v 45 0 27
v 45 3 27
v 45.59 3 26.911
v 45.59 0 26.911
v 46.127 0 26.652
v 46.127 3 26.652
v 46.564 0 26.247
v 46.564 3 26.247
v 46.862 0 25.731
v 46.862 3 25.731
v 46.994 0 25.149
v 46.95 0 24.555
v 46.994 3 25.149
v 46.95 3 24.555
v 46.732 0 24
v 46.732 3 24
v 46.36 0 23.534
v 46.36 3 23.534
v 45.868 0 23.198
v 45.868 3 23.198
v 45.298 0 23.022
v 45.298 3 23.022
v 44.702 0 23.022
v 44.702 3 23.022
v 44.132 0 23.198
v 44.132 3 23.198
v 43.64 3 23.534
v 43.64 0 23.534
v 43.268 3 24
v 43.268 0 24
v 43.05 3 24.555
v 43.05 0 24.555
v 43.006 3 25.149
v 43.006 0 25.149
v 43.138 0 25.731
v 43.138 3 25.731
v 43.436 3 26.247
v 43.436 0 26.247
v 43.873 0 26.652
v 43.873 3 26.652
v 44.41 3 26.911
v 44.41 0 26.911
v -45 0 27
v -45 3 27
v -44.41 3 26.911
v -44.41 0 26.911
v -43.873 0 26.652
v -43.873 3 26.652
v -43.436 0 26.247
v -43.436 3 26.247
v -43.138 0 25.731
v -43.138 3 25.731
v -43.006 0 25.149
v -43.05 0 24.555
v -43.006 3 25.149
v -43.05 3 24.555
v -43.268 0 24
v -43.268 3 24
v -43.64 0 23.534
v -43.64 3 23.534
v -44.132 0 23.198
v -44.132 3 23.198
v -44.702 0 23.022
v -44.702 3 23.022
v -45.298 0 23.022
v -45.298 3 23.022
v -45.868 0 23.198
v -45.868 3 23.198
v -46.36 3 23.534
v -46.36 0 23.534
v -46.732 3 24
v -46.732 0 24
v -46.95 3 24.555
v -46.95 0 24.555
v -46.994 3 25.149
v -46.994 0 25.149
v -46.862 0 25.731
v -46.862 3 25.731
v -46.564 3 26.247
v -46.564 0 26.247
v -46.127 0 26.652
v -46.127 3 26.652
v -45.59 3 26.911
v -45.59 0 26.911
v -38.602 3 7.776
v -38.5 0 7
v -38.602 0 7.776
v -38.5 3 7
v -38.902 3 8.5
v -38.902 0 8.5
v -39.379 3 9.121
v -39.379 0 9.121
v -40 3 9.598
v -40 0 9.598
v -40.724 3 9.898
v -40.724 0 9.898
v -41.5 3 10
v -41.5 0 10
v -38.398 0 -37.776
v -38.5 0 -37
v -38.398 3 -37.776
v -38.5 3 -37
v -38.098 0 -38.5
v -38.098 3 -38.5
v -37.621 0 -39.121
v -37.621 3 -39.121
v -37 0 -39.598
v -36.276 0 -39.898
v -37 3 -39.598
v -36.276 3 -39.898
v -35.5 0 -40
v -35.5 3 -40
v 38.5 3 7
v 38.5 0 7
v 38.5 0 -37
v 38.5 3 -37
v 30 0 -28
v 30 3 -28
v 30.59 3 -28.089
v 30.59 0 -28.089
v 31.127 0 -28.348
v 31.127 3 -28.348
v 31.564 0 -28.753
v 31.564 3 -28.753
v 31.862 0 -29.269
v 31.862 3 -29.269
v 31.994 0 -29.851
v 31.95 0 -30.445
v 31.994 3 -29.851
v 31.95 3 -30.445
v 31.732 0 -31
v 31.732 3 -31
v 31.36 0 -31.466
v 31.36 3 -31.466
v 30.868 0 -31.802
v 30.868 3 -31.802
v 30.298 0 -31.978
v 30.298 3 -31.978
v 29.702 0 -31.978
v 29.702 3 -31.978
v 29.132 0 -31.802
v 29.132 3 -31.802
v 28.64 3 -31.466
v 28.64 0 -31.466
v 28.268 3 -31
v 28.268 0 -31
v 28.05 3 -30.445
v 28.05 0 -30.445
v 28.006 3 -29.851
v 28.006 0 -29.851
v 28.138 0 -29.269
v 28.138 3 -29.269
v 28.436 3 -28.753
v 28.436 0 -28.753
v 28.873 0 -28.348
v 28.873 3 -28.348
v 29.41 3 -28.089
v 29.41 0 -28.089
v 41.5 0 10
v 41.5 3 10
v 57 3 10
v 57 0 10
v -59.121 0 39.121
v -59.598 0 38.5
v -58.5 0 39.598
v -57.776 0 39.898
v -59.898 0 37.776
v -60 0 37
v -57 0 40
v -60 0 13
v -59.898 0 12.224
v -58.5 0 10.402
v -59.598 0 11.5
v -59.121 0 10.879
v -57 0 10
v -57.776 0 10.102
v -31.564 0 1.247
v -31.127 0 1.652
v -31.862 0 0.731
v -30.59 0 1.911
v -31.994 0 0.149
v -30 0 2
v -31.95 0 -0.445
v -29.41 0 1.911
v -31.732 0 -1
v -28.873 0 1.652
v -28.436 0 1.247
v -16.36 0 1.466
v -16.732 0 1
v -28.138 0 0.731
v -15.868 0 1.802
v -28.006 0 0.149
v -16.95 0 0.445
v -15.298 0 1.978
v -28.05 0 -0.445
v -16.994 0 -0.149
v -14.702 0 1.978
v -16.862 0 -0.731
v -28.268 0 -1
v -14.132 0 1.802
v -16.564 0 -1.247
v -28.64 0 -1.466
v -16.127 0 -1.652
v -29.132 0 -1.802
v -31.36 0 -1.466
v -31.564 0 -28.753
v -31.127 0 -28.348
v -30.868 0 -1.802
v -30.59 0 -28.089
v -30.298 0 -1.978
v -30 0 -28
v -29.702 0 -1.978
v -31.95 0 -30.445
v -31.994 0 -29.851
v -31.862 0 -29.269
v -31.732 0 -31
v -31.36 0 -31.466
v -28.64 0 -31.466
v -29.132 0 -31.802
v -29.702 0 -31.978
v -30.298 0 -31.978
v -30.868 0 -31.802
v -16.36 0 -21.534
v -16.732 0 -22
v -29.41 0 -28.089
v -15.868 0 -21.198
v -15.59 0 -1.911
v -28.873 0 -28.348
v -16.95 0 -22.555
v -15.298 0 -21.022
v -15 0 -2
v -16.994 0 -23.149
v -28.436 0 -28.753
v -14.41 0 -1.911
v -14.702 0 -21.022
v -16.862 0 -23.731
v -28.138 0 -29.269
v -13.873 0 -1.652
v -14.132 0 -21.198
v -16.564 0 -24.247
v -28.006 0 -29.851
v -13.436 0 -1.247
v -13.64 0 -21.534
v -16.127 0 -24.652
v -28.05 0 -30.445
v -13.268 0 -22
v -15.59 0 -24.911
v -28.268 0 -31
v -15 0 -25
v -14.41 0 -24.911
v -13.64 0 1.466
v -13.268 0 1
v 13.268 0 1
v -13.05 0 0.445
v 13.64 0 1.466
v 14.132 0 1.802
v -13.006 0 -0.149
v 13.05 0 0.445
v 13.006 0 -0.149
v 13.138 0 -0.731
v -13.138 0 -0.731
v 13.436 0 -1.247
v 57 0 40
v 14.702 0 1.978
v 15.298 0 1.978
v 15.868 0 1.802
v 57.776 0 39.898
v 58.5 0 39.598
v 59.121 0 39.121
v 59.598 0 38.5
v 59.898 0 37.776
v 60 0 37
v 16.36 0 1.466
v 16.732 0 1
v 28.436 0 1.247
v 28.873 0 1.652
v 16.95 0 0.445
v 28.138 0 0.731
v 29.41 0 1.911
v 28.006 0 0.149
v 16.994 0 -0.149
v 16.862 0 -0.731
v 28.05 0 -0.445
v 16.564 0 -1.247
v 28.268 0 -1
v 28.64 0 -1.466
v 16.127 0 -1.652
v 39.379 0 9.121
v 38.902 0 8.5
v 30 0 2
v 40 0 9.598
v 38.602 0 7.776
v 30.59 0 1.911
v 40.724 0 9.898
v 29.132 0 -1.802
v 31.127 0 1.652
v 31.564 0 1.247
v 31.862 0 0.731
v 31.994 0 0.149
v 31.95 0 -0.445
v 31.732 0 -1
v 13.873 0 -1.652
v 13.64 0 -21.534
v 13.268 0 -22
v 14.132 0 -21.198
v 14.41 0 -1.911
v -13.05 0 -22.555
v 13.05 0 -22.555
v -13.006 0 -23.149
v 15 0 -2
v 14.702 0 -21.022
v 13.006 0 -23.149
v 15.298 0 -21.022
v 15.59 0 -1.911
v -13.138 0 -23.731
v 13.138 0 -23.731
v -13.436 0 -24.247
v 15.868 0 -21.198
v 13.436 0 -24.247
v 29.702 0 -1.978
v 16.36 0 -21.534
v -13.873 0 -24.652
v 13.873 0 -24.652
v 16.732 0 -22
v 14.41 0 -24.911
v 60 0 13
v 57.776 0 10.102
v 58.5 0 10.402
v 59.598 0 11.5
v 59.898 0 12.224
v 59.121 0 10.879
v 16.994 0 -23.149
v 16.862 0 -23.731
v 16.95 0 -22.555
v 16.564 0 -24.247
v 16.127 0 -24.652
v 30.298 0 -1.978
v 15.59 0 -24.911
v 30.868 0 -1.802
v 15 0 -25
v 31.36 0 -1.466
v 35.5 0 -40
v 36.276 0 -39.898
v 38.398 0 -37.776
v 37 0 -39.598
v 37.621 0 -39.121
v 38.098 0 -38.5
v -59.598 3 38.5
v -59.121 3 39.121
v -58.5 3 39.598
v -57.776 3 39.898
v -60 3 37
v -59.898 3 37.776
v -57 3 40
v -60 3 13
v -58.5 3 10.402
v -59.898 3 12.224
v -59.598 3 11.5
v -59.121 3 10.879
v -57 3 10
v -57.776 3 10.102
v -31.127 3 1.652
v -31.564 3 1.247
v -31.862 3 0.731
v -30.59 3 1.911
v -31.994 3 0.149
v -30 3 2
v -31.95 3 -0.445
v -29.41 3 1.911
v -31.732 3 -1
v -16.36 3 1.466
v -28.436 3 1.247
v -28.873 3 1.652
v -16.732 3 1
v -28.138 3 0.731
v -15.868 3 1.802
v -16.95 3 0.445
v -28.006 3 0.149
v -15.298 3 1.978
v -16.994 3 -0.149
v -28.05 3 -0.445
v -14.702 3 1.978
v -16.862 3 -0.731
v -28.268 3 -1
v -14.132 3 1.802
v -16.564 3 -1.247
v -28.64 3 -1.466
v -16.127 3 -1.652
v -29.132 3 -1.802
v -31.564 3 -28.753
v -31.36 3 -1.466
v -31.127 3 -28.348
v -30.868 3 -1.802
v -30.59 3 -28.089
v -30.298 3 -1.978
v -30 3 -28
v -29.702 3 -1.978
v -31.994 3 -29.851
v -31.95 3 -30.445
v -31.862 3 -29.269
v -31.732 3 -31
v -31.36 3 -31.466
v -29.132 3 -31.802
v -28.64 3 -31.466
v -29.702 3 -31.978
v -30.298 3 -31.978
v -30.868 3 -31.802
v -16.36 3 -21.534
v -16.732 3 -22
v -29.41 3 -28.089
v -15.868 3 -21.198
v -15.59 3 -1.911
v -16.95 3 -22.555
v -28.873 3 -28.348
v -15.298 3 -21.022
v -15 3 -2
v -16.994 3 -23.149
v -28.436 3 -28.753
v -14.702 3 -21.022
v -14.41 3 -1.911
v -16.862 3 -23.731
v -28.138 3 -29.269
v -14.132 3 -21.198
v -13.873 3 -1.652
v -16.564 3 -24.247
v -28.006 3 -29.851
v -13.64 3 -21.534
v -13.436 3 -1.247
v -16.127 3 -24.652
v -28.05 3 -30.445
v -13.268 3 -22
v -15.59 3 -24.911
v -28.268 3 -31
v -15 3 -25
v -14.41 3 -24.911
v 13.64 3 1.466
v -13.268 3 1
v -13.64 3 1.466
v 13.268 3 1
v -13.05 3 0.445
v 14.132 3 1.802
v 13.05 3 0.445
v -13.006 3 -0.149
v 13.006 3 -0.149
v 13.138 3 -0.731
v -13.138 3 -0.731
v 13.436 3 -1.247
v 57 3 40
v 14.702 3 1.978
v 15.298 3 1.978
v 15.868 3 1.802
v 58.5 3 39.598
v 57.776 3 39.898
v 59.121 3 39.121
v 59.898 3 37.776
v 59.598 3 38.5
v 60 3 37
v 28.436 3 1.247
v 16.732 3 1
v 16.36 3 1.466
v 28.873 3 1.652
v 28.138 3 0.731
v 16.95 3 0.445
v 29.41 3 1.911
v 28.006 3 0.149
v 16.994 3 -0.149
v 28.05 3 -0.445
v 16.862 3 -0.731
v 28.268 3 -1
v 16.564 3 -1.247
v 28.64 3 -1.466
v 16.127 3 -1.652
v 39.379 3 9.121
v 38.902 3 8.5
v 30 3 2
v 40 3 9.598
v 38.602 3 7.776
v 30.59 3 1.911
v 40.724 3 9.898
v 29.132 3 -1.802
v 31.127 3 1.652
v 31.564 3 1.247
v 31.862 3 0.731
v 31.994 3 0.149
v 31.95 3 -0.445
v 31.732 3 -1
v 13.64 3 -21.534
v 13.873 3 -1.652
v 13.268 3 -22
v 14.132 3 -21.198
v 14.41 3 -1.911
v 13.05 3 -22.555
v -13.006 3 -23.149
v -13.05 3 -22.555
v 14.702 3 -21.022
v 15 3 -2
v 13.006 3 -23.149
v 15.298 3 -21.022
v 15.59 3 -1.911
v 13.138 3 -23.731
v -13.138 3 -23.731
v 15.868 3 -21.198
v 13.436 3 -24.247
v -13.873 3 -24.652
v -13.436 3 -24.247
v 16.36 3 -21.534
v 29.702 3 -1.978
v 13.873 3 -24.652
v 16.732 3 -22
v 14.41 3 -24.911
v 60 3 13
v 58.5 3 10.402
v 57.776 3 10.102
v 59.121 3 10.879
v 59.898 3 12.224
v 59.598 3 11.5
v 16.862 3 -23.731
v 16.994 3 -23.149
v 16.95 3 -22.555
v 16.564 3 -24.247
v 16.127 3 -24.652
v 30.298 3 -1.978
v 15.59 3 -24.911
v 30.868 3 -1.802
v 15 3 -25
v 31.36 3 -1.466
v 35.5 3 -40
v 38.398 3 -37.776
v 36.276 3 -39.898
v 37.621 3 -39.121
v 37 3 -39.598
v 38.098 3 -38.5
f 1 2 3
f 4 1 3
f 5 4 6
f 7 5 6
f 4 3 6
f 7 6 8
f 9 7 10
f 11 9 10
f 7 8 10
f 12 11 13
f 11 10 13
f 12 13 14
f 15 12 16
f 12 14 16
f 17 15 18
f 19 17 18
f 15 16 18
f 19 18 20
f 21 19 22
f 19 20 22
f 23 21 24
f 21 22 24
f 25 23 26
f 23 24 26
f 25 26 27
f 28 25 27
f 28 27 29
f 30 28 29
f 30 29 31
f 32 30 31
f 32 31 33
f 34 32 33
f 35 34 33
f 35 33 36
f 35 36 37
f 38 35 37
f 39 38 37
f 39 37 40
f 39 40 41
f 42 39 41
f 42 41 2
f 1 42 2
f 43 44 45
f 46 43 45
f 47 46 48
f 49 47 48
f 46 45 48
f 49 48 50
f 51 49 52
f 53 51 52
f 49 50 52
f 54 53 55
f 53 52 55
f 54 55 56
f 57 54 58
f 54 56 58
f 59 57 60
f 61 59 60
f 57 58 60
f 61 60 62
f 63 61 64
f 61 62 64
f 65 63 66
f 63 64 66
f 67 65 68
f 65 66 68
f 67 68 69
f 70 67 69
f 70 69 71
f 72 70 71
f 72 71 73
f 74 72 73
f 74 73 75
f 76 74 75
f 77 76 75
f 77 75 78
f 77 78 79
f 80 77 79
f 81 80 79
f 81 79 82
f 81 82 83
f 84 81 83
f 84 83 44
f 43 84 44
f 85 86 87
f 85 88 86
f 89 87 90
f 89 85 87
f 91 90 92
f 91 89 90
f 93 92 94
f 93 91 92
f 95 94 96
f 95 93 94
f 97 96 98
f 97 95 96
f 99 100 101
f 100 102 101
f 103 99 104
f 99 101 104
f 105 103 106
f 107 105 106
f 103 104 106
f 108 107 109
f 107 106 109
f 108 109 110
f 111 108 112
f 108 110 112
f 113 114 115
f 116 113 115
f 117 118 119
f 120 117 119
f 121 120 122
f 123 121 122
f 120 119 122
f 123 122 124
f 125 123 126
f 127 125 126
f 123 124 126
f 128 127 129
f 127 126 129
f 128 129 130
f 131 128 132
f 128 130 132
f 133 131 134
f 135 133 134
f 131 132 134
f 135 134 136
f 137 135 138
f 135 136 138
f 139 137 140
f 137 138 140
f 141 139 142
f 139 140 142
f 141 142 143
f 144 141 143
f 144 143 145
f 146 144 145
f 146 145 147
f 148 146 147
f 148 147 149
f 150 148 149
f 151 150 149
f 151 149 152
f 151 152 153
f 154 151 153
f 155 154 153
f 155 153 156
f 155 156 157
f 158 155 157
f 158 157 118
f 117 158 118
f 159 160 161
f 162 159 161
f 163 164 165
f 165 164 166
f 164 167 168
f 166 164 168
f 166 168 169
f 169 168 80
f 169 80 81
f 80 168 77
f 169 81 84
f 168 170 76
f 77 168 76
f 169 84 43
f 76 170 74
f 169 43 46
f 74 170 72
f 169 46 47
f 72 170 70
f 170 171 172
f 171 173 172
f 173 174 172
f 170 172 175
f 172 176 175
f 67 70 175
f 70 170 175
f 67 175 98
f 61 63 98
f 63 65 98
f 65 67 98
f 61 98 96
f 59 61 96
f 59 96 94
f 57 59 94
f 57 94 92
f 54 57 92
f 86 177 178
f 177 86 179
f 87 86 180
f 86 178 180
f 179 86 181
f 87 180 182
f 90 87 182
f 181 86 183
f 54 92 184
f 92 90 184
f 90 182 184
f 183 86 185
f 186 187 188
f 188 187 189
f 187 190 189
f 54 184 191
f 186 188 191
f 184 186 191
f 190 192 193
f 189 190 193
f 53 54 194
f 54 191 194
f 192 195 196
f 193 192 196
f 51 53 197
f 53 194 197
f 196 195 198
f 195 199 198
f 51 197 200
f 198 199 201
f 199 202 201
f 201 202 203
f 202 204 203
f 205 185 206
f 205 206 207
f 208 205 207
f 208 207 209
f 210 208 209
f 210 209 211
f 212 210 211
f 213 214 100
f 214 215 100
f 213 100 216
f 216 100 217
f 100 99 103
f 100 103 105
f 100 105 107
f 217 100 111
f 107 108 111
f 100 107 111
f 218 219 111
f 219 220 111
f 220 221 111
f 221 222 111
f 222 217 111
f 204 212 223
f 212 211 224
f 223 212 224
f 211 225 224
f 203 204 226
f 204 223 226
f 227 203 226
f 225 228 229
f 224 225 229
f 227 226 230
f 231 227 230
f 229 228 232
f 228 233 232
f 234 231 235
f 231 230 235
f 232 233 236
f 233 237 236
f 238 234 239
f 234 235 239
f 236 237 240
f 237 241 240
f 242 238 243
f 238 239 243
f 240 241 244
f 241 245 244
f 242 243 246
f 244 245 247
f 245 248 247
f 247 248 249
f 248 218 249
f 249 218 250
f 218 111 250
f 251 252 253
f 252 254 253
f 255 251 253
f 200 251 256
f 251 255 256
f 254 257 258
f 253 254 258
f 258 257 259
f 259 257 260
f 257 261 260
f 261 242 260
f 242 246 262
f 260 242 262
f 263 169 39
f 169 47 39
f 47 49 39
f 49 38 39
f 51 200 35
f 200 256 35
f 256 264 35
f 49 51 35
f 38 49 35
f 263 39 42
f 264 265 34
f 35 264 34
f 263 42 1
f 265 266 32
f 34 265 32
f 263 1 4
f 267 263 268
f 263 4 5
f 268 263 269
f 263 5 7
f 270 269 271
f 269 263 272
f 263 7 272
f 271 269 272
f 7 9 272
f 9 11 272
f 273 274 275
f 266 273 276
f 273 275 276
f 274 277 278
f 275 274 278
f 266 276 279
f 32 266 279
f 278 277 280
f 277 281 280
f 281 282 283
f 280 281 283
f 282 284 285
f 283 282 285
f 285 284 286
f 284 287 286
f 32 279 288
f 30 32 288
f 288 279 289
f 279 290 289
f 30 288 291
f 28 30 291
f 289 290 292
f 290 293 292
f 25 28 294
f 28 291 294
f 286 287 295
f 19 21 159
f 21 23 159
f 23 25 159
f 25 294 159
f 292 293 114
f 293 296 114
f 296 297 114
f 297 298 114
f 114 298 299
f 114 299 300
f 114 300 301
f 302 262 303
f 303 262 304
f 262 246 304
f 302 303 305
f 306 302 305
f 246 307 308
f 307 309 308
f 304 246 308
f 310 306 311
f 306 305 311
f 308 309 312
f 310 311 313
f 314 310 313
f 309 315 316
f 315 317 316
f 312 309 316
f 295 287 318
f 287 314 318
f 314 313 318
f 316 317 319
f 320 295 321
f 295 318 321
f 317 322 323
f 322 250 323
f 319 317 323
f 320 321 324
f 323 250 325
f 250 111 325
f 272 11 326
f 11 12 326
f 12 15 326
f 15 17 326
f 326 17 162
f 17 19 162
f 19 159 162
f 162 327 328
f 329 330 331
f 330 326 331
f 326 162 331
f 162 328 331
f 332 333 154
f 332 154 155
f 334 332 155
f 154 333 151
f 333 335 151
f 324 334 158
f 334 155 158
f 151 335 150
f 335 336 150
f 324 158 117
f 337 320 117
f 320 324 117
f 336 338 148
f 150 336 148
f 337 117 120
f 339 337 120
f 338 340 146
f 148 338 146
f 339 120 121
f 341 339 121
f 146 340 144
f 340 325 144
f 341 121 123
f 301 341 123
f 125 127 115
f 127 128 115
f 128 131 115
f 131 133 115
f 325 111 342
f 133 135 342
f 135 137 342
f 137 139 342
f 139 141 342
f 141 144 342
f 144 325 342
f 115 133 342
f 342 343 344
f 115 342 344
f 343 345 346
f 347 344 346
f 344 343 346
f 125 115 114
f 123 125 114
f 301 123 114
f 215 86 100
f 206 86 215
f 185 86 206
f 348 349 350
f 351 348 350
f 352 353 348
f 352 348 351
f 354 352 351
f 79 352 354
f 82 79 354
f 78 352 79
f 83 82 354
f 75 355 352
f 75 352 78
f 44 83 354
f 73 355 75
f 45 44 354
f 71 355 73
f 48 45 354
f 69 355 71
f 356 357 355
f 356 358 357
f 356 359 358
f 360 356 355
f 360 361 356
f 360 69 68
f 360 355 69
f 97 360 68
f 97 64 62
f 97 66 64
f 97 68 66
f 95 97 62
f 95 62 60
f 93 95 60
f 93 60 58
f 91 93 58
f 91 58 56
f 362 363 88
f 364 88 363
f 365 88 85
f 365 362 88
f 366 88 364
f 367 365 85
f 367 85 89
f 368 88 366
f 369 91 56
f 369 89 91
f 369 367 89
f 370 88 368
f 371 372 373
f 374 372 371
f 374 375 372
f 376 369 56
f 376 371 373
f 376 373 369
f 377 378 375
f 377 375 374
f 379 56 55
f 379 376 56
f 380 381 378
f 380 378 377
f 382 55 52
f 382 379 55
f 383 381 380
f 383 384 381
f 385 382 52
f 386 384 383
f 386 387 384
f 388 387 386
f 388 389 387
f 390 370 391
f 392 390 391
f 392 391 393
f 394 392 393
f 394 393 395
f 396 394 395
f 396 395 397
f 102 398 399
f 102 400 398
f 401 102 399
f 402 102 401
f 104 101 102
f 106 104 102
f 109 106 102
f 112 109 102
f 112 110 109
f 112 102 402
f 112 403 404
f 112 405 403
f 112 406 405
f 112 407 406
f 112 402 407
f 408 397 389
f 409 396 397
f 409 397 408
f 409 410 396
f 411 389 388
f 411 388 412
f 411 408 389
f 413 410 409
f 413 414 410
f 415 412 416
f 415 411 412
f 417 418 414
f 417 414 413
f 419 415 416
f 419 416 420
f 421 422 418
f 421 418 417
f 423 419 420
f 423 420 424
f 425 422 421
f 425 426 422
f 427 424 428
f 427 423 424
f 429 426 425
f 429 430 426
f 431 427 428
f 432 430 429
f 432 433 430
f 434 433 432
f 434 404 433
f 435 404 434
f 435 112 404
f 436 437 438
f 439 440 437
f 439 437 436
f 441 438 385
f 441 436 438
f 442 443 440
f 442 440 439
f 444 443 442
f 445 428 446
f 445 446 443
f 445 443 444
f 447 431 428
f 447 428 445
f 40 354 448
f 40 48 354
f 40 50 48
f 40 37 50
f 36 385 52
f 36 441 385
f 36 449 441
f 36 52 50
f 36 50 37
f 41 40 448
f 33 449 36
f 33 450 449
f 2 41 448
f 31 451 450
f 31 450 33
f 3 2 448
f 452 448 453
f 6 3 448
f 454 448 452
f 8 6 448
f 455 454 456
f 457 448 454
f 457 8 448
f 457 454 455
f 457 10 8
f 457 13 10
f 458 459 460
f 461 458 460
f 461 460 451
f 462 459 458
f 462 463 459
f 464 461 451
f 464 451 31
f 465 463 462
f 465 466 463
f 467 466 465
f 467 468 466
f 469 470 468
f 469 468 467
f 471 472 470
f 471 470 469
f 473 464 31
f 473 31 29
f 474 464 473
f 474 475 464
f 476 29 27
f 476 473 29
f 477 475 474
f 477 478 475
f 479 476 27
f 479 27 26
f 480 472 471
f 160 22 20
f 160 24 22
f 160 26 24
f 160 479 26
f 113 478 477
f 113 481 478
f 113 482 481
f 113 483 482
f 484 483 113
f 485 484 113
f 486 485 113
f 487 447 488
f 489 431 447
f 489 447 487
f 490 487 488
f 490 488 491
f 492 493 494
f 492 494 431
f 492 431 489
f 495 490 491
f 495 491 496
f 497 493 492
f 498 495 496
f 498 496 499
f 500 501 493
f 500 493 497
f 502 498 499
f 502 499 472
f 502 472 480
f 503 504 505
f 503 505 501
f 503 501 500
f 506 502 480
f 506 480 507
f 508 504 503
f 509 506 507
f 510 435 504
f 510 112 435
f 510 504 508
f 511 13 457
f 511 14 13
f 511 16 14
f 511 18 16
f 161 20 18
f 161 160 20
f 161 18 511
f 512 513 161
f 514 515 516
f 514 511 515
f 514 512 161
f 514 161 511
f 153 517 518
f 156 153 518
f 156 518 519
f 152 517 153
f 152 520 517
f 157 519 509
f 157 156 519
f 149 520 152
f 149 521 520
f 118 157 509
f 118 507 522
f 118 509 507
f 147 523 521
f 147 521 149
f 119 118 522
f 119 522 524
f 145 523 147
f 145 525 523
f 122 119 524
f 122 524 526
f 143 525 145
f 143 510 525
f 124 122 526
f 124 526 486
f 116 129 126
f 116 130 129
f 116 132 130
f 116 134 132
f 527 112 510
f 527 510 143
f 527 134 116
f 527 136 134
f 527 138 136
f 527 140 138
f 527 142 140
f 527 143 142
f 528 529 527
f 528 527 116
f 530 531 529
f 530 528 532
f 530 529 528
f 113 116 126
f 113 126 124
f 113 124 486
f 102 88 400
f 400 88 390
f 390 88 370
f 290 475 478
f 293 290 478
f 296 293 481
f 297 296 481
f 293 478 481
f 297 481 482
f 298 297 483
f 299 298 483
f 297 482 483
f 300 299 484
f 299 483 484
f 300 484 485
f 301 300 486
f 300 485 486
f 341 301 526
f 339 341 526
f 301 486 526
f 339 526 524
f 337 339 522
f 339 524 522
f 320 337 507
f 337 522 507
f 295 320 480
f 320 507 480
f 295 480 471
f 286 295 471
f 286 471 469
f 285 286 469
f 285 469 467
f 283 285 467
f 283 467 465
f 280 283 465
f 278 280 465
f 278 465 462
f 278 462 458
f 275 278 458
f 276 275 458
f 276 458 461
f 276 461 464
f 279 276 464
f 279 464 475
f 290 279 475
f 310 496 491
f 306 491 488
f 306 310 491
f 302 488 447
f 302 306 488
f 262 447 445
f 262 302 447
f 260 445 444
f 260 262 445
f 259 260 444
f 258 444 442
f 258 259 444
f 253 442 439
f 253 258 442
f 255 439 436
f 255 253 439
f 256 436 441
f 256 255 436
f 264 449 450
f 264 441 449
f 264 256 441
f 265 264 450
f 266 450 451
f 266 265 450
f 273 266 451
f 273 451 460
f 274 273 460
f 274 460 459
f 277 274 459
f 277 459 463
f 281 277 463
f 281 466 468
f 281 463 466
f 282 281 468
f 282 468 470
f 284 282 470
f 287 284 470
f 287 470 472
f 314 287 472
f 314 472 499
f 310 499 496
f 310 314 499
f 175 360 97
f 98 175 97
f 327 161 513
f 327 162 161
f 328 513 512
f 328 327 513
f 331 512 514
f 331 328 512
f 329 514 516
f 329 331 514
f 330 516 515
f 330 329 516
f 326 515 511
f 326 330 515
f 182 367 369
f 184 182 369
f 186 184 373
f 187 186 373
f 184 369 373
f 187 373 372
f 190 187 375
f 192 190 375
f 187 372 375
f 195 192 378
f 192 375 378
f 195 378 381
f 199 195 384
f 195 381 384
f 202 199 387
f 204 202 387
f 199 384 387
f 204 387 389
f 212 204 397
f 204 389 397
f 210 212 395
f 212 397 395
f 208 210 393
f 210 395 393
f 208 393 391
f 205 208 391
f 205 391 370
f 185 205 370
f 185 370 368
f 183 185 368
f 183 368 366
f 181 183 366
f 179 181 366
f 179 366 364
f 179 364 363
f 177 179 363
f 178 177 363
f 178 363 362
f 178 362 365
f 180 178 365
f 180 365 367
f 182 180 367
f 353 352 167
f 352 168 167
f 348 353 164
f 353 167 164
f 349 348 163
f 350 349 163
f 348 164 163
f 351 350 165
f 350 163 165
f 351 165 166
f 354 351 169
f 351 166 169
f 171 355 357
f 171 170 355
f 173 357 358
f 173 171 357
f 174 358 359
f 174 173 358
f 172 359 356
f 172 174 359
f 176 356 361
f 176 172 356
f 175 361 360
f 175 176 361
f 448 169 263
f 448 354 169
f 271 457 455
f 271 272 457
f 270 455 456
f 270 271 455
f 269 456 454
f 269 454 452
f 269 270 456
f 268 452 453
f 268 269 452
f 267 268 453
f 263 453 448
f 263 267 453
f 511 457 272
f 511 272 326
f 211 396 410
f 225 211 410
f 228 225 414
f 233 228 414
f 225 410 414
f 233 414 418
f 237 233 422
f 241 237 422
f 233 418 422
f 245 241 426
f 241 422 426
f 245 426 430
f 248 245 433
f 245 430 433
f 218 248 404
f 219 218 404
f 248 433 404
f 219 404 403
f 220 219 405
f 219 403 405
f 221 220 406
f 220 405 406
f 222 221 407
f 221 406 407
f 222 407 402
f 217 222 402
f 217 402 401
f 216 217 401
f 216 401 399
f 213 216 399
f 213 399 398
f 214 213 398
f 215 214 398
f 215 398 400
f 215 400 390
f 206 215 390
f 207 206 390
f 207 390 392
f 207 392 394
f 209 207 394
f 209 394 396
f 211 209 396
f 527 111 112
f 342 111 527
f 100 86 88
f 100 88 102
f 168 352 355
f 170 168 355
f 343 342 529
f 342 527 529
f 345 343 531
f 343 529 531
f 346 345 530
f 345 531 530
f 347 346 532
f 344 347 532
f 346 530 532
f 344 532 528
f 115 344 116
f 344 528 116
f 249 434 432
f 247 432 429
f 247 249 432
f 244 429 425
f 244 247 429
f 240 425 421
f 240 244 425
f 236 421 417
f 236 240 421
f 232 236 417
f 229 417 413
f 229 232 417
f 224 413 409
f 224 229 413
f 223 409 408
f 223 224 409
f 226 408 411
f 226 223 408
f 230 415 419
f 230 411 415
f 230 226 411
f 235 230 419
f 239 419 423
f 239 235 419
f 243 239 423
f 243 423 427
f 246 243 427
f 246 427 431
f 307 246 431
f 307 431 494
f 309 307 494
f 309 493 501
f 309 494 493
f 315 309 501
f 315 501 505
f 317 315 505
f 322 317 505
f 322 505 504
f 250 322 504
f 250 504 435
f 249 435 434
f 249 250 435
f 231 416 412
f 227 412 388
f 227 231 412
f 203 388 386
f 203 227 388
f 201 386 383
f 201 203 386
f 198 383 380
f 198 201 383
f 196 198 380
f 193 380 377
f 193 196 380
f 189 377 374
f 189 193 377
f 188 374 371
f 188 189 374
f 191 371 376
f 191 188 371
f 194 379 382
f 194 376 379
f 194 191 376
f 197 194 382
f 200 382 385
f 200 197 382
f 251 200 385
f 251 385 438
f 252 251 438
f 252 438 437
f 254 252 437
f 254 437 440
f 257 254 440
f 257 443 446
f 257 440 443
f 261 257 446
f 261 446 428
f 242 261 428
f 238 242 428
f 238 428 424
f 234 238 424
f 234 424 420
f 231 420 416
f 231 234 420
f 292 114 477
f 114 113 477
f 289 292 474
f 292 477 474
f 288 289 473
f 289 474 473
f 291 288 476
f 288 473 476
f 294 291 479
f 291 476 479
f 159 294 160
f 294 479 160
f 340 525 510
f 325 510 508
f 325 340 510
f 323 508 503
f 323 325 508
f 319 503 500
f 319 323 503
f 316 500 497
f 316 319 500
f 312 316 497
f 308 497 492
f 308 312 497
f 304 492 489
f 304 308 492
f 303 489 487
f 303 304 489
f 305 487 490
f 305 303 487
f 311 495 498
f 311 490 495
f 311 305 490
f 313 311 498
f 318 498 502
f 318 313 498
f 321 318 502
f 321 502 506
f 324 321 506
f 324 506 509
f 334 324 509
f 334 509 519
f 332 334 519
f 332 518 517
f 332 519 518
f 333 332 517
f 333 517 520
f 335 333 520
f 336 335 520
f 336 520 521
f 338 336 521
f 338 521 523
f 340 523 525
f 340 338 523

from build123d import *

# Parameters (mm, degrees)
SZKIC1_W                    = 77
SZKIC1_H                    = 80
DODANIE_WYCI_GNI_CIE1_DEPTH = 3
WYTNIJ_WYCI_GNI_CIE1_REACH  = 57.599
SZKIC2_R                    = 2.5
SZKIC2_R_2                  = 2
ZAOKR_GLENIE1_R             = 3
ZAOKR_GLENIE2_R             = 3
WYTNIJ_WYCI_GNI_CIE3_REACH  = 57.599
SZKIC3_R                    = 2
SZKIC5_W                    = 120
SZKIC5_H                    = 30
DODANIE_WYCI_GNI_CIE2_DEPTH = 3
ZAOKR_GLENIE4_R             = 3
WYTNIJ_WYCI_GNI_CIE4_REACH  = 74.173
SZKIC6_R                    = 2


with BuildPart() as part:
    # Szkic1 → Dodanie-wyciągnięcie1 (new body)
    with BuildSketch(Plane(origin=(0, 0, 0), x_dir=(1, 0, 0), z_dir=(0, 1, 0))):
        Rectangle(SZKIC1_W, SZKIC1_H)
    extrude(amount=DODANIE_WYCI_GNI_CIE1_DEPTH)

    # Szkic2 → Wytnij-wyciągnięcie1 (cut, up to next)
    with BuildSketch(Plane(origin=(0, 3, 0), x_dir=(1, 0, 0), z_dir=(0, 1, 0)), mode=Mode.PRIVATE) as wytnij_wyci_gni_cie1_sk1:
        with Locations(Location((-23.5, -25, 0), (0, 0, 270))):
            Circle(SZKIC2_R)
    wytnij_wyci_gni_cie1_tool1 = extrude(wytnij_wyci_gni_cie1_sk1.sketch, amount=-WYTNIJ_WYCI_GNI_CIE1_REACH, mode=Mode.PRIVATE) & part.part
    # Szkic2 → Wytnij-wyciągnięcie1 (cut, up to next)
    with BuildSketch(Plane(origin=(0, 3, 0), x_dir=(1, 0, 0), z_dir=(0, 1, 0)), mode=Mode.PRIVATE) as wytnij_wyci_gni_cie1_sk2:
        with Locations(Location((23.5, -25, 0), (0, 0, 270))):
            Circle(SZKIC2_R)
    wytnij_wyci_gni_cie1_tool2 = extrude(wytnij_wyci_gni_cie1_sk2.sketch, amount=-WYTNIJ_WYCI_GNI_CIE1_REACH, mode=Mode.PRIVATE) & part.part
    # Szkic2 → Wytnij-wyciągnięcie1 (cut, up to next)
    with BuildSketch(Plane(origin=(0, 3, 0), x_dir=(1, 0, 0), z_dir=(0, 1, 0)), mode=Mode.PRIVATE) as wytnij_wyci_gni_cie1_sk3:
        with Locations(Location((-30, 30, 0), (0, 0, 270))):
            Circle(SZKIC2_R_2)
    wytnij_wyci_gni_cie1_tool3 = extrude(wytnij_wyci_gni_cie1_sk3.sketch, amount=-WYTNIJ_WYCI_GNI_CIE1_REACH, mode=Mode.PRIVATE) & part.part
    # Szkic2 → Wytnij-wyciągnięcie1 (cut, up to next)
    with BuildSketch(Plane(origin=(0, 3, 0), x_dir=(1, 0, 0), z_dir=(0, 1, 0)), mode=Mode.PRIVATE) as wytnij_wyci_gni_cie1_sk4:
        with Locations(Location((-30, 0, 0), (0, 0, 270))):
            Circle(SZKIC2_R_2)
    wytnij_wyci_gni_cie1_tool4 = extrude(wytnij_wyci_gni_cie1_sk4.sketch, amount=-WYTNIJ_WYCI_GNI_CIE1_REACH, mode=Mode.PRIVATE) & part.part
    # Szkic2 → Wytnij-wyciągnięcie1 (cut, up to next)
    with BuildSketch(Plane(origin=(0, 3, 0), x_dir=(1, 0, 0), z_dir=(0, 1, 0)), mode=Mode.PRIVATE) as wytnij_wyci_gni_cie1_sk5:
        with Locations(Location((30, 0, 0), (0, 0, 270))):
            Circle(SZKIC2_R_2)
    wytnij_wyci_gni_cie1_tool5 = extrude(wytnij_wyci_gni_cie1_sk5.sketch, amount=-WYTNIJ_WYCI_GNI_CIE1_REACH, mode=Mode.PRIVATE) & part.part
    # Szkic2 → Wytnij-wyciągnięcie1 (cut, up to next)
    with BuildSketch(Plane(origin=(0, 3, 0), x_dir=(1, 0, 0), z_dir=(0, 1, 0)), mode=Mode.PRIVATE) as wytnij_wyci_gni_cie1_sk6:
        with Locations(Location((30, 30, 0), (0, 0, 270))):
            Circle(SZKIC2_R_2)
    wytnij_wyci_gni_cie1_tool6 = extrude(wytnij_wyci_gni_cie1_sk6.sketch, amount=-WYTNIJ_WYCI_GNI_CIE1_REACH, mode=Mode.PRIVATE) & part.part
    add(wytnij_wyci_gni_cie1_tool1.solids().sort_by_distance((-23.5, 3, 25))[0], mode=Mode.SUBTRACT)
    add(wytnij_wyci_gni_cie1_tool2.solids().sort_by_distance((23.5, 3, 25))[0], mode=Mode.SUBTRACT)
    add(wytnij_wyci_gni_cie1_tool3.solids().sort_by_distance((-30, 3, -30))[0], mode=Mode.SUBTRACT)
    add(wytnij_wyci_gni_cie1_tool4.solids().sort_by_distance((-30, 3, 0))[0], mode=Mode.SUBTRACT)
    add(wytnij_wyci_gni_cie1_tool5.solids().sort_by_distance((30, 3, 0))[0], mode=Mode.SUBTRACT)
    add(wytnij_wyci_gni_cie1_tool6.solids().sort_by_distance((30, 3, -30))[0], mode=Mode.SUBTRACT)

    # Zaokrąglenie1
    zaokr_glenie1_edges = [part.edges().sort_by_distance(p)[0] for p in [
        (-38.5, 1.5, -40),
    ]]
    fillet(zaokr_glenie1_edges, radius=ZAOKR_GLENIE1_R)

    # Zaokrąglenie2
    zaokr_glenie2_edges = [part.edges().sort_by_distance(p)[0] for p in [
        (38.5, 1.5, 40),
        (-38.5, 1.5, 40),
        (38.5, 1.5, -40),
    ]]
    fillet(zaokr_glenie2_edges, radius=ZAOKR_GLENIE2_R)

    # Szkic3 → Wytnij-wyciągnięcie3 (cut, up to next)
    with BuildSketch(Plane(origin=(0, 0, 0), x_dir=(1, 0, 0), z_dir=(0, 1, 0)), mode=Mode.PRIVATE) as wytnij_wyci_gni_cie3_sk1:
        with Locations(Location((-15, 23, 0), (0, 0, 90))):
            Circle(SZKIC3_R)
    wytnij_wyci_gni_cie3_tool1 = extrude(wytnij_wyci_gni_cie3_sk1.sketch, amount=WYTNIJ_WYCI_GNI_CIE3_REACH, mode=Mode.PRIVATE) & part.part
    # Szkic3 → Wytnij-wyciągnięcie3 (cut, up to next)
    with BuildSketch(Plane(origin=(0, 0, 0), x_dir=(1, 0, 0), z_dir=(0, 1, 0)), mode=Mode.PRIVATE) as wytnij_wyci_gni_cie3_sk2:
        with Locations(Location((15, 23, 0), (0, 0, 90))):
            Circle(SZKIC3_R)
    wytnij_wyci_gni_cie3_tool2 = extrude(wytnij_wyci_gni_cie3_sk2.sketch, amount=WYTNIJ_WYCI_GNI_CIE3_REACH, mode=Mode.PRIVATE) & part.part
    # Szkic3 → Wytnij-wyciągnięcie3 (cut, up to next)
    with BuildSketch(Plane(origin=(0, 0, 0), x_dir=(1, 0, 0), z_dir=(0, 1, 0)), mode=Mode.PRIVATE) as wytnij_wyci_gni_cie3_sk3:
        with Locations(Location((-15, 0, 0), (0, 0, 90))):
            Circle(SZKIC3_R)
    wytnij_wyci_gni_cie3_tool3 = extrude(wytnij_wyci_gni_cie3_sk3.sketch, amount=WYTNIJ_WYCI_GNI_CIE3_REACH, mode=Mode.PRIVATE) & part.part
    # Szkic3 → Wytnij-wyciągnięcie3 (cut, up to next)
    with BuildSketch(Plane(origin=(0, 0, 0), x_dir=(1, 0, 0), z_dir=(0, 1, 0)), mode=Mode.PRIVATE) as wytnij_wyci_gni_cie3_sk4:
        with Locations(Location((15, 0, 0), (0, 0, 90))):
            Circle(SZKIC3_R)
    wytnij_wyci_gni_cie3_tool4 = extrude(wytnij_wyci_gni_cie3_sk4.sketch, amount=WYTNIJ_WYCI_GNI_CIE3_REACH, mode=Mode.PRIVATE) & part.part
    add(wytnij_wyci_gni_cie3_tool1.solids().sort_by_distance((-15, 0, -23))[0], mode=Mode.SUBTRACT)
    add(wytnij_wyci_gni_cie3_tool2.solids().sort_by_distance((15, 0, -23))[0], mode=Mode.SUBTRACT)
    add(wytnij_wyci_gni_cie3_tool3.solids().sort_by_distance((-15, 0, 0))[0], mode=Mode.SUBTRACT)
    add(wytnij_wyci_gni_cie3_tool4.solids().sort_by_distance((15, 0, 0))[0], mode=Mode.SUBTRACT)

    # Szkic5 → Dodanie-wyciągnięcie2 (add)
    with BuildSketch(Plane(origin=(0, 3, 0), x_dir=(1, 0, 0), z_dir=(0, 1, 0))):
        with Locations((0, -25)):
            Rectangle(SZKIC5_W, SZKIC5_H)
    extrude(amount=-DODANIE_WYCI_GNI_CIE2_DEPTH)

    # Zaokrąglenie4
    zaokr_glenie4_edges = [part.edges().sort_by_distance(p)[0] for p in [
        (-60, 1.5, 10),
        (60, 1.5, 40),
        (-60, 1.5, 40),
        (38.5, 1.5, 10),
        (-38.5, 1.5, 10),
        (60, 1.5, 10),
    ]]
    fillet(zaokr_glenie4_edges, radius=ZAOKR_GLENIE4_R)

    # Szkic6 → Wytnij-wyciągnięcie4 (cut, up to next)
    with BuildSketch(Plane(origin=(0, 3, 0), x_dir=(1, 0, 0), z_dir=(0, 1, 0)), mode=Mode.PRIVATE) as wytnij_wyci_gni_cie4_sk1:
        with Locations(Location((-45, -25, 0), (0, 0, 270))):
            Circle(SZKIC6_R)
    wytnij_wyci_gni_cie4_tool1 = extrude(wytnij_wyci_gni_cie4_sk1.sketch, amount=-WYTNIJ_WYCI_GNI_CIE4_REACH, mode=Mode.PRIVATE) & part.part
    # Szkic6 → Wytnij-wyciągnięcie4 (cut, up to next)
    with BuildSketch(Plane(origin=(0, 3, 0), x_dir=(1, 0, 0), z_dir=(0, 1, 0)), mode=Mode.PRIVATE) as wytnij_wyci_gni_cie4_sk2:
        with Locations(Location((45, -25, 0), (0, 0, 270))):
            Circle(SZKIC6_R)
    wytnij_wyci_gni_cie4_tool2 = extrude(wytnij_wyci_gni_cie4_sk2.sketch, amount=-WYTNIJ_WYCI_GNI_CIE4_REACH, mode=Mode.PRIVATE) & part.part
    add(wytnij_wyci_gni_cie4_tool1.solids().sort_by_distance((-45, 3, 25))[0], mode=Mode.SUBTRACT)
    add(wytnij_wyci_gni_cie4_tool2.solids().sort_by_distance((45, 3, 25))[0], mode=Mode.SUBTRACT)


solid = part.part
